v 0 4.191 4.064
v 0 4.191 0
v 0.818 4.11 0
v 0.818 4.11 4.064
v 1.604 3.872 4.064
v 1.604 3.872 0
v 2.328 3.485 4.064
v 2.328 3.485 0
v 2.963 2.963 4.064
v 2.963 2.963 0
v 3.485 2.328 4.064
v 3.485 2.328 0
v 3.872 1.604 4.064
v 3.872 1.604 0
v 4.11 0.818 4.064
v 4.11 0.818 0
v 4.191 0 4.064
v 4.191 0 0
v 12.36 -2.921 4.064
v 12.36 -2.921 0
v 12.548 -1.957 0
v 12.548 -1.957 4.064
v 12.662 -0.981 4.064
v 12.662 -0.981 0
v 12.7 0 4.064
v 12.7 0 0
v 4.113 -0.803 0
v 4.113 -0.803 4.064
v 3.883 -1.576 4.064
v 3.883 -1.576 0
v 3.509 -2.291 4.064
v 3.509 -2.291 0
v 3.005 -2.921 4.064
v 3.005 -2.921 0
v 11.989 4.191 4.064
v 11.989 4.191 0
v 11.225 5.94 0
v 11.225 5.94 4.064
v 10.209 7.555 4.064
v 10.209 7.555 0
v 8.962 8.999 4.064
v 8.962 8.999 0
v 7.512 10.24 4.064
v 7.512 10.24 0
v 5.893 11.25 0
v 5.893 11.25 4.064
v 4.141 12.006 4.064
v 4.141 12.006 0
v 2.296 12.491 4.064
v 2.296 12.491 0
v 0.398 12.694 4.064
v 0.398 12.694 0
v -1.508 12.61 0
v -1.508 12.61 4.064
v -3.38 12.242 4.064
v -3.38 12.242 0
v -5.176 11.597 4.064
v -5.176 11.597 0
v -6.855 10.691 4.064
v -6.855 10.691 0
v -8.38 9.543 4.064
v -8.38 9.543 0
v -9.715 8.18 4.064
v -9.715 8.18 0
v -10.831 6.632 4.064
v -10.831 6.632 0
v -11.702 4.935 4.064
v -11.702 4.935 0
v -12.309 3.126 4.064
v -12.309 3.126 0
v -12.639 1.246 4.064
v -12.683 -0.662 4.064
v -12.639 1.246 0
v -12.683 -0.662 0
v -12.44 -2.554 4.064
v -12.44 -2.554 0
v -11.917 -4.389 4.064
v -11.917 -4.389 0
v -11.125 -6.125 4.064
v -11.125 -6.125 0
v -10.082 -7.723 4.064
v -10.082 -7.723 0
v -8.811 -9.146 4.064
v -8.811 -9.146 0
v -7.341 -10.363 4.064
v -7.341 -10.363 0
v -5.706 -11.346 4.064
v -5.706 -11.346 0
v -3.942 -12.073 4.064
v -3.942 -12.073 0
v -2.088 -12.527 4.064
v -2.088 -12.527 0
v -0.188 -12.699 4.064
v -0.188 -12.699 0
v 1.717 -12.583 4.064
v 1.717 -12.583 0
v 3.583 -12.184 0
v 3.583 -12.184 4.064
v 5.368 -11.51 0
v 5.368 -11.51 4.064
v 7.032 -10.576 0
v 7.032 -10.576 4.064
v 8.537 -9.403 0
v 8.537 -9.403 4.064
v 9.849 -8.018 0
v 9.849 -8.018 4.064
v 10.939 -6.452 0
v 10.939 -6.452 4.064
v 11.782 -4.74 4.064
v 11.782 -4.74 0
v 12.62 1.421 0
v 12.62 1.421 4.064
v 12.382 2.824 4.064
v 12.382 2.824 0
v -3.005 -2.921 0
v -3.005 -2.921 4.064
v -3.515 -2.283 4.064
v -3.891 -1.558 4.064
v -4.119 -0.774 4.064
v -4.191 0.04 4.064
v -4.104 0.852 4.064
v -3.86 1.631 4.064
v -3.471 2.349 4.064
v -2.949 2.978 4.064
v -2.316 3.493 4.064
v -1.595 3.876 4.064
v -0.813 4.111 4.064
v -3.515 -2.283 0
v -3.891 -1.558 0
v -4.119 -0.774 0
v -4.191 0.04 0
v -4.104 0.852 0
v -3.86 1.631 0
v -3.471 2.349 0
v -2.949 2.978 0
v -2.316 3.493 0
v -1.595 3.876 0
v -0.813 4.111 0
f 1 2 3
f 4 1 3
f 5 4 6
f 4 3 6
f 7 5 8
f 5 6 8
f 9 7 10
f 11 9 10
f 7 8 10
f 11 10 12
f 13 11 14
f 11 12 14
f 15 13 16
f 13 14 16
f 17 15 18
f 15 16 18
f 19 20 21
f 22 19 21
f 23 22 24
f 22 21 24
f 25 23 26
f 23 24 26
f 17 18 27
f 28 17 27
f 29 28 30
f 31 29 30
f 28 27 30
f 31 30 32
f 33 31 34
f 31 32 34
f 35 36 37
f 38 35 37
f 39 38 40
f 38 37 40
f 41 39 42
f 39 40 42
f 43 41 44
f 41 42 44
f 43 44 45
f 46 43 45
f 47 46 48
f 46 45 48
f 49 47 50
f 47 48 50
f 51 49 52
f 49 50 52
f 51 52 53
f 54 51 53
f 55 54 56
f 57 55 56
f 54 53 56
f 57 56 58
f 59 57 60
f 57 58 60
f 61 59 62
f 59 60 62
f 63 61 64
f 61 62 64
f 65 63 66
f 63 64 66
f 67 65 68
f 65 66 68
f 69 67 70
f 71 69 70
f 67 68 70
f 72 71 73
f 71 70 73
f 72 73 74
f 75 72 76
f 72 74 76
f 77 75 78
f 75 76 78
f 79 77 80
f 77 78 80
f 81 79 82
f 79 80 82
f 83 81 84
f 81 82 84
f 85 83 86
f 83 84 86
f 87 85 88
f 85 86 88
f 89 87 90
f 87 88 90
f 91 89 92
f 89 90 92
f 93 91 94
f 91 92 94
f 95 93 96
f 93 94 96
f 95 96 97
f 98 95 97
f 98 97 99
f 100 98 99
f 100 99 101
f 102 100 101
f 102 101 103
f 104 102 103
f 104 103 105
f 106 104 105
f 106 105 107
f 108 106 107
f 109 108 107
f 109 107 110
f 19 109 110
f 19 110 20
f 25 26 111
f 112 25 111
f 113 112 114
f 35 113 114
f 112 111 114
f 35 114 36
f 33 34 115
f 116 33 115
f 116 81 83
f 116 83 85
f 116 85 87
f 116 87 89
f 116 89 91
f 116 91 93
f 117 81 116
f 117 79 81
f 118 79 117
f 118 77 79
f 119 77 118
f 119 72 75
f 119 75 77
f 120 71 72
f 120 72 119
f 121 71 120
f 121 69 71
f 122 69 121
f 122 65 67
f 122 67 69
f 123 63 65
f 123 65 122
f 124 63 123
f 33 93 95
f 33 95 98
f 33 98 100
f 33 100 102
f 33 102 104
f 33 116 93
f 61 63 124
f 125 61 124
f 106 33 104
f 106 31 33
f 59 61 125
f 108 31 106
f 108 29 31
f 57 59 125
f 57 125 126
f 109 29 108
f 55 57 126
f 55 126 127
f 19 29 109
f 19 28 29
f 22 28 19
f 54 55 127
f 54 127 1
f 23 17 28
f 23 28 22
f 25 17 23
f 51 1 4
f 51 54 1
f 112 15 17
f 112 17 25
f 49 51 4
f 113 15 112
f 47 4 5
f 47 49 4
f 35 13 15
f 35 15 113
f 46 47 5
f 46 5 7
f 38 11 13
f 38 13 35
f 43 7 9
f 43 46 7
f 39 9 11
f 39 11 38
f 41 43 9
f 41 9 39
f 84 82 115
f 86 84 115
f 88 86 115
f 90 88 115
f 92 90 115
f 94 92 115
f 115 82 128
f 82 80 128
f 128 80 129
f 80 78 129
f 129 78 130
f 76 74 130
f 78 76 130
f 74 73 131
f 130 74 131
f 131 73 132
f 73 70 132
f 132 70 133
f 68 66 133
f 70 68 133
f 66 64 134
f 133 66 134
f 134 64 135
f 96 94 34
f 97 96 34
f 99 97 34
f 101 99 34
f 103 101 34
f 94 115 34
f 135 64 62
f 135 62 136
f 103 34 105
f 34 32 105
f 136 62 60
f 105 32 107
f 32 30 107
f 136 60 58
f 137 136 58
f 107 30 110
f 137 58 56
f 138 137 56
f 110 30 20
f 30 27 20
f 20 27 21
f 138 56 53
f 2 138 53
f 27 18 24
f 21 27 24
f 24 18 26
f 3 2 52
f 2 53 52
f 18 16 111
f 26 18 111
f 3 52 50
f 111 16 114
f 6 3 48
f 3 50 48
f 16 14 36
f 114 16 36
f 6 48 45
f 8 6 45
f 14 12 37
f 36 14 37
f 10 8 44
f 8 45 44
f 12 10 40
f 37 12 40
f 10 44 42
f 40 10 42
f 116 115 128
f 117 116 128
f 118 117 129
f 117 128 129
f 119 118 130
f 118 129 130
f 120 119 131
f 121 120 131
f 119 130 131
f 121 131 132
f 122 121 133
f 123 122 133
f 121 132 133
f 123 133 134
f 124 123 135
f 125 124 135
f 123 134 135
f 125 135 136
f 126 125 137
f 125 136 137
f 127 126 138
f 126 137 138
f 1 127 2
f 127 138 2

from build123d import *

# Parameters (mm, degrees)
F1_DEPTH = 4.064


with BuildPart() as f1:
    # F0 (on Top) → F1 (new body)
    with BuildSketch(Plane.XY):
        with BuildLine():
            ThreePointArc((-3.0053685298, -2.921), (-3.860465775, 1.6313445375), (0, 4.191))
            Line((0, 4.191), (11.9885578365, 4.191))
            ThreePointArc((11.9885578365, 4.191), (-12.6827588318, -0.6615348929), (12.3595209859, -2.921))
            Line((12.3595209859, -2.921), (3.0053685298, -2.921))
            ThreePointArc((3.0053685298, -2.921), (0, -4.191), (-3.0053685298, -2.921))
        make_face()
        with BuildLine():
            ThreePointArc((0, 4.191), (2.96348452, 2.96348452), (4.191, 0))
            ThreePointArc((4.191, 0), (3.883296313, -1.5762267431), (3.0053685298, -2.921))
            Line((3.0053685298, -2.921), (12.3595209859, -2.921))
            ThreePointArc((12.3595209859, -2.921), (12.6145930676, -1.4703882956), (12.7, 0))
            ThreePointArc((12.7, 0), (12.5208762578, 2.1254782375), (11.9885578365, 4.191))
            Line((11.9885578365, 4.191), (0, 4.191))
        make_face()
        with BuildLine():
            ThreePointArc((-3.0053685298, -2.921), (0, -4.191), (3.0053685298, -2.921))
            Line((3.0053685298, -2.921), (-3.0053685298, -2.921))
        make_face()
    extrude(amount=F1_DEPTH)


solid = f1.part
